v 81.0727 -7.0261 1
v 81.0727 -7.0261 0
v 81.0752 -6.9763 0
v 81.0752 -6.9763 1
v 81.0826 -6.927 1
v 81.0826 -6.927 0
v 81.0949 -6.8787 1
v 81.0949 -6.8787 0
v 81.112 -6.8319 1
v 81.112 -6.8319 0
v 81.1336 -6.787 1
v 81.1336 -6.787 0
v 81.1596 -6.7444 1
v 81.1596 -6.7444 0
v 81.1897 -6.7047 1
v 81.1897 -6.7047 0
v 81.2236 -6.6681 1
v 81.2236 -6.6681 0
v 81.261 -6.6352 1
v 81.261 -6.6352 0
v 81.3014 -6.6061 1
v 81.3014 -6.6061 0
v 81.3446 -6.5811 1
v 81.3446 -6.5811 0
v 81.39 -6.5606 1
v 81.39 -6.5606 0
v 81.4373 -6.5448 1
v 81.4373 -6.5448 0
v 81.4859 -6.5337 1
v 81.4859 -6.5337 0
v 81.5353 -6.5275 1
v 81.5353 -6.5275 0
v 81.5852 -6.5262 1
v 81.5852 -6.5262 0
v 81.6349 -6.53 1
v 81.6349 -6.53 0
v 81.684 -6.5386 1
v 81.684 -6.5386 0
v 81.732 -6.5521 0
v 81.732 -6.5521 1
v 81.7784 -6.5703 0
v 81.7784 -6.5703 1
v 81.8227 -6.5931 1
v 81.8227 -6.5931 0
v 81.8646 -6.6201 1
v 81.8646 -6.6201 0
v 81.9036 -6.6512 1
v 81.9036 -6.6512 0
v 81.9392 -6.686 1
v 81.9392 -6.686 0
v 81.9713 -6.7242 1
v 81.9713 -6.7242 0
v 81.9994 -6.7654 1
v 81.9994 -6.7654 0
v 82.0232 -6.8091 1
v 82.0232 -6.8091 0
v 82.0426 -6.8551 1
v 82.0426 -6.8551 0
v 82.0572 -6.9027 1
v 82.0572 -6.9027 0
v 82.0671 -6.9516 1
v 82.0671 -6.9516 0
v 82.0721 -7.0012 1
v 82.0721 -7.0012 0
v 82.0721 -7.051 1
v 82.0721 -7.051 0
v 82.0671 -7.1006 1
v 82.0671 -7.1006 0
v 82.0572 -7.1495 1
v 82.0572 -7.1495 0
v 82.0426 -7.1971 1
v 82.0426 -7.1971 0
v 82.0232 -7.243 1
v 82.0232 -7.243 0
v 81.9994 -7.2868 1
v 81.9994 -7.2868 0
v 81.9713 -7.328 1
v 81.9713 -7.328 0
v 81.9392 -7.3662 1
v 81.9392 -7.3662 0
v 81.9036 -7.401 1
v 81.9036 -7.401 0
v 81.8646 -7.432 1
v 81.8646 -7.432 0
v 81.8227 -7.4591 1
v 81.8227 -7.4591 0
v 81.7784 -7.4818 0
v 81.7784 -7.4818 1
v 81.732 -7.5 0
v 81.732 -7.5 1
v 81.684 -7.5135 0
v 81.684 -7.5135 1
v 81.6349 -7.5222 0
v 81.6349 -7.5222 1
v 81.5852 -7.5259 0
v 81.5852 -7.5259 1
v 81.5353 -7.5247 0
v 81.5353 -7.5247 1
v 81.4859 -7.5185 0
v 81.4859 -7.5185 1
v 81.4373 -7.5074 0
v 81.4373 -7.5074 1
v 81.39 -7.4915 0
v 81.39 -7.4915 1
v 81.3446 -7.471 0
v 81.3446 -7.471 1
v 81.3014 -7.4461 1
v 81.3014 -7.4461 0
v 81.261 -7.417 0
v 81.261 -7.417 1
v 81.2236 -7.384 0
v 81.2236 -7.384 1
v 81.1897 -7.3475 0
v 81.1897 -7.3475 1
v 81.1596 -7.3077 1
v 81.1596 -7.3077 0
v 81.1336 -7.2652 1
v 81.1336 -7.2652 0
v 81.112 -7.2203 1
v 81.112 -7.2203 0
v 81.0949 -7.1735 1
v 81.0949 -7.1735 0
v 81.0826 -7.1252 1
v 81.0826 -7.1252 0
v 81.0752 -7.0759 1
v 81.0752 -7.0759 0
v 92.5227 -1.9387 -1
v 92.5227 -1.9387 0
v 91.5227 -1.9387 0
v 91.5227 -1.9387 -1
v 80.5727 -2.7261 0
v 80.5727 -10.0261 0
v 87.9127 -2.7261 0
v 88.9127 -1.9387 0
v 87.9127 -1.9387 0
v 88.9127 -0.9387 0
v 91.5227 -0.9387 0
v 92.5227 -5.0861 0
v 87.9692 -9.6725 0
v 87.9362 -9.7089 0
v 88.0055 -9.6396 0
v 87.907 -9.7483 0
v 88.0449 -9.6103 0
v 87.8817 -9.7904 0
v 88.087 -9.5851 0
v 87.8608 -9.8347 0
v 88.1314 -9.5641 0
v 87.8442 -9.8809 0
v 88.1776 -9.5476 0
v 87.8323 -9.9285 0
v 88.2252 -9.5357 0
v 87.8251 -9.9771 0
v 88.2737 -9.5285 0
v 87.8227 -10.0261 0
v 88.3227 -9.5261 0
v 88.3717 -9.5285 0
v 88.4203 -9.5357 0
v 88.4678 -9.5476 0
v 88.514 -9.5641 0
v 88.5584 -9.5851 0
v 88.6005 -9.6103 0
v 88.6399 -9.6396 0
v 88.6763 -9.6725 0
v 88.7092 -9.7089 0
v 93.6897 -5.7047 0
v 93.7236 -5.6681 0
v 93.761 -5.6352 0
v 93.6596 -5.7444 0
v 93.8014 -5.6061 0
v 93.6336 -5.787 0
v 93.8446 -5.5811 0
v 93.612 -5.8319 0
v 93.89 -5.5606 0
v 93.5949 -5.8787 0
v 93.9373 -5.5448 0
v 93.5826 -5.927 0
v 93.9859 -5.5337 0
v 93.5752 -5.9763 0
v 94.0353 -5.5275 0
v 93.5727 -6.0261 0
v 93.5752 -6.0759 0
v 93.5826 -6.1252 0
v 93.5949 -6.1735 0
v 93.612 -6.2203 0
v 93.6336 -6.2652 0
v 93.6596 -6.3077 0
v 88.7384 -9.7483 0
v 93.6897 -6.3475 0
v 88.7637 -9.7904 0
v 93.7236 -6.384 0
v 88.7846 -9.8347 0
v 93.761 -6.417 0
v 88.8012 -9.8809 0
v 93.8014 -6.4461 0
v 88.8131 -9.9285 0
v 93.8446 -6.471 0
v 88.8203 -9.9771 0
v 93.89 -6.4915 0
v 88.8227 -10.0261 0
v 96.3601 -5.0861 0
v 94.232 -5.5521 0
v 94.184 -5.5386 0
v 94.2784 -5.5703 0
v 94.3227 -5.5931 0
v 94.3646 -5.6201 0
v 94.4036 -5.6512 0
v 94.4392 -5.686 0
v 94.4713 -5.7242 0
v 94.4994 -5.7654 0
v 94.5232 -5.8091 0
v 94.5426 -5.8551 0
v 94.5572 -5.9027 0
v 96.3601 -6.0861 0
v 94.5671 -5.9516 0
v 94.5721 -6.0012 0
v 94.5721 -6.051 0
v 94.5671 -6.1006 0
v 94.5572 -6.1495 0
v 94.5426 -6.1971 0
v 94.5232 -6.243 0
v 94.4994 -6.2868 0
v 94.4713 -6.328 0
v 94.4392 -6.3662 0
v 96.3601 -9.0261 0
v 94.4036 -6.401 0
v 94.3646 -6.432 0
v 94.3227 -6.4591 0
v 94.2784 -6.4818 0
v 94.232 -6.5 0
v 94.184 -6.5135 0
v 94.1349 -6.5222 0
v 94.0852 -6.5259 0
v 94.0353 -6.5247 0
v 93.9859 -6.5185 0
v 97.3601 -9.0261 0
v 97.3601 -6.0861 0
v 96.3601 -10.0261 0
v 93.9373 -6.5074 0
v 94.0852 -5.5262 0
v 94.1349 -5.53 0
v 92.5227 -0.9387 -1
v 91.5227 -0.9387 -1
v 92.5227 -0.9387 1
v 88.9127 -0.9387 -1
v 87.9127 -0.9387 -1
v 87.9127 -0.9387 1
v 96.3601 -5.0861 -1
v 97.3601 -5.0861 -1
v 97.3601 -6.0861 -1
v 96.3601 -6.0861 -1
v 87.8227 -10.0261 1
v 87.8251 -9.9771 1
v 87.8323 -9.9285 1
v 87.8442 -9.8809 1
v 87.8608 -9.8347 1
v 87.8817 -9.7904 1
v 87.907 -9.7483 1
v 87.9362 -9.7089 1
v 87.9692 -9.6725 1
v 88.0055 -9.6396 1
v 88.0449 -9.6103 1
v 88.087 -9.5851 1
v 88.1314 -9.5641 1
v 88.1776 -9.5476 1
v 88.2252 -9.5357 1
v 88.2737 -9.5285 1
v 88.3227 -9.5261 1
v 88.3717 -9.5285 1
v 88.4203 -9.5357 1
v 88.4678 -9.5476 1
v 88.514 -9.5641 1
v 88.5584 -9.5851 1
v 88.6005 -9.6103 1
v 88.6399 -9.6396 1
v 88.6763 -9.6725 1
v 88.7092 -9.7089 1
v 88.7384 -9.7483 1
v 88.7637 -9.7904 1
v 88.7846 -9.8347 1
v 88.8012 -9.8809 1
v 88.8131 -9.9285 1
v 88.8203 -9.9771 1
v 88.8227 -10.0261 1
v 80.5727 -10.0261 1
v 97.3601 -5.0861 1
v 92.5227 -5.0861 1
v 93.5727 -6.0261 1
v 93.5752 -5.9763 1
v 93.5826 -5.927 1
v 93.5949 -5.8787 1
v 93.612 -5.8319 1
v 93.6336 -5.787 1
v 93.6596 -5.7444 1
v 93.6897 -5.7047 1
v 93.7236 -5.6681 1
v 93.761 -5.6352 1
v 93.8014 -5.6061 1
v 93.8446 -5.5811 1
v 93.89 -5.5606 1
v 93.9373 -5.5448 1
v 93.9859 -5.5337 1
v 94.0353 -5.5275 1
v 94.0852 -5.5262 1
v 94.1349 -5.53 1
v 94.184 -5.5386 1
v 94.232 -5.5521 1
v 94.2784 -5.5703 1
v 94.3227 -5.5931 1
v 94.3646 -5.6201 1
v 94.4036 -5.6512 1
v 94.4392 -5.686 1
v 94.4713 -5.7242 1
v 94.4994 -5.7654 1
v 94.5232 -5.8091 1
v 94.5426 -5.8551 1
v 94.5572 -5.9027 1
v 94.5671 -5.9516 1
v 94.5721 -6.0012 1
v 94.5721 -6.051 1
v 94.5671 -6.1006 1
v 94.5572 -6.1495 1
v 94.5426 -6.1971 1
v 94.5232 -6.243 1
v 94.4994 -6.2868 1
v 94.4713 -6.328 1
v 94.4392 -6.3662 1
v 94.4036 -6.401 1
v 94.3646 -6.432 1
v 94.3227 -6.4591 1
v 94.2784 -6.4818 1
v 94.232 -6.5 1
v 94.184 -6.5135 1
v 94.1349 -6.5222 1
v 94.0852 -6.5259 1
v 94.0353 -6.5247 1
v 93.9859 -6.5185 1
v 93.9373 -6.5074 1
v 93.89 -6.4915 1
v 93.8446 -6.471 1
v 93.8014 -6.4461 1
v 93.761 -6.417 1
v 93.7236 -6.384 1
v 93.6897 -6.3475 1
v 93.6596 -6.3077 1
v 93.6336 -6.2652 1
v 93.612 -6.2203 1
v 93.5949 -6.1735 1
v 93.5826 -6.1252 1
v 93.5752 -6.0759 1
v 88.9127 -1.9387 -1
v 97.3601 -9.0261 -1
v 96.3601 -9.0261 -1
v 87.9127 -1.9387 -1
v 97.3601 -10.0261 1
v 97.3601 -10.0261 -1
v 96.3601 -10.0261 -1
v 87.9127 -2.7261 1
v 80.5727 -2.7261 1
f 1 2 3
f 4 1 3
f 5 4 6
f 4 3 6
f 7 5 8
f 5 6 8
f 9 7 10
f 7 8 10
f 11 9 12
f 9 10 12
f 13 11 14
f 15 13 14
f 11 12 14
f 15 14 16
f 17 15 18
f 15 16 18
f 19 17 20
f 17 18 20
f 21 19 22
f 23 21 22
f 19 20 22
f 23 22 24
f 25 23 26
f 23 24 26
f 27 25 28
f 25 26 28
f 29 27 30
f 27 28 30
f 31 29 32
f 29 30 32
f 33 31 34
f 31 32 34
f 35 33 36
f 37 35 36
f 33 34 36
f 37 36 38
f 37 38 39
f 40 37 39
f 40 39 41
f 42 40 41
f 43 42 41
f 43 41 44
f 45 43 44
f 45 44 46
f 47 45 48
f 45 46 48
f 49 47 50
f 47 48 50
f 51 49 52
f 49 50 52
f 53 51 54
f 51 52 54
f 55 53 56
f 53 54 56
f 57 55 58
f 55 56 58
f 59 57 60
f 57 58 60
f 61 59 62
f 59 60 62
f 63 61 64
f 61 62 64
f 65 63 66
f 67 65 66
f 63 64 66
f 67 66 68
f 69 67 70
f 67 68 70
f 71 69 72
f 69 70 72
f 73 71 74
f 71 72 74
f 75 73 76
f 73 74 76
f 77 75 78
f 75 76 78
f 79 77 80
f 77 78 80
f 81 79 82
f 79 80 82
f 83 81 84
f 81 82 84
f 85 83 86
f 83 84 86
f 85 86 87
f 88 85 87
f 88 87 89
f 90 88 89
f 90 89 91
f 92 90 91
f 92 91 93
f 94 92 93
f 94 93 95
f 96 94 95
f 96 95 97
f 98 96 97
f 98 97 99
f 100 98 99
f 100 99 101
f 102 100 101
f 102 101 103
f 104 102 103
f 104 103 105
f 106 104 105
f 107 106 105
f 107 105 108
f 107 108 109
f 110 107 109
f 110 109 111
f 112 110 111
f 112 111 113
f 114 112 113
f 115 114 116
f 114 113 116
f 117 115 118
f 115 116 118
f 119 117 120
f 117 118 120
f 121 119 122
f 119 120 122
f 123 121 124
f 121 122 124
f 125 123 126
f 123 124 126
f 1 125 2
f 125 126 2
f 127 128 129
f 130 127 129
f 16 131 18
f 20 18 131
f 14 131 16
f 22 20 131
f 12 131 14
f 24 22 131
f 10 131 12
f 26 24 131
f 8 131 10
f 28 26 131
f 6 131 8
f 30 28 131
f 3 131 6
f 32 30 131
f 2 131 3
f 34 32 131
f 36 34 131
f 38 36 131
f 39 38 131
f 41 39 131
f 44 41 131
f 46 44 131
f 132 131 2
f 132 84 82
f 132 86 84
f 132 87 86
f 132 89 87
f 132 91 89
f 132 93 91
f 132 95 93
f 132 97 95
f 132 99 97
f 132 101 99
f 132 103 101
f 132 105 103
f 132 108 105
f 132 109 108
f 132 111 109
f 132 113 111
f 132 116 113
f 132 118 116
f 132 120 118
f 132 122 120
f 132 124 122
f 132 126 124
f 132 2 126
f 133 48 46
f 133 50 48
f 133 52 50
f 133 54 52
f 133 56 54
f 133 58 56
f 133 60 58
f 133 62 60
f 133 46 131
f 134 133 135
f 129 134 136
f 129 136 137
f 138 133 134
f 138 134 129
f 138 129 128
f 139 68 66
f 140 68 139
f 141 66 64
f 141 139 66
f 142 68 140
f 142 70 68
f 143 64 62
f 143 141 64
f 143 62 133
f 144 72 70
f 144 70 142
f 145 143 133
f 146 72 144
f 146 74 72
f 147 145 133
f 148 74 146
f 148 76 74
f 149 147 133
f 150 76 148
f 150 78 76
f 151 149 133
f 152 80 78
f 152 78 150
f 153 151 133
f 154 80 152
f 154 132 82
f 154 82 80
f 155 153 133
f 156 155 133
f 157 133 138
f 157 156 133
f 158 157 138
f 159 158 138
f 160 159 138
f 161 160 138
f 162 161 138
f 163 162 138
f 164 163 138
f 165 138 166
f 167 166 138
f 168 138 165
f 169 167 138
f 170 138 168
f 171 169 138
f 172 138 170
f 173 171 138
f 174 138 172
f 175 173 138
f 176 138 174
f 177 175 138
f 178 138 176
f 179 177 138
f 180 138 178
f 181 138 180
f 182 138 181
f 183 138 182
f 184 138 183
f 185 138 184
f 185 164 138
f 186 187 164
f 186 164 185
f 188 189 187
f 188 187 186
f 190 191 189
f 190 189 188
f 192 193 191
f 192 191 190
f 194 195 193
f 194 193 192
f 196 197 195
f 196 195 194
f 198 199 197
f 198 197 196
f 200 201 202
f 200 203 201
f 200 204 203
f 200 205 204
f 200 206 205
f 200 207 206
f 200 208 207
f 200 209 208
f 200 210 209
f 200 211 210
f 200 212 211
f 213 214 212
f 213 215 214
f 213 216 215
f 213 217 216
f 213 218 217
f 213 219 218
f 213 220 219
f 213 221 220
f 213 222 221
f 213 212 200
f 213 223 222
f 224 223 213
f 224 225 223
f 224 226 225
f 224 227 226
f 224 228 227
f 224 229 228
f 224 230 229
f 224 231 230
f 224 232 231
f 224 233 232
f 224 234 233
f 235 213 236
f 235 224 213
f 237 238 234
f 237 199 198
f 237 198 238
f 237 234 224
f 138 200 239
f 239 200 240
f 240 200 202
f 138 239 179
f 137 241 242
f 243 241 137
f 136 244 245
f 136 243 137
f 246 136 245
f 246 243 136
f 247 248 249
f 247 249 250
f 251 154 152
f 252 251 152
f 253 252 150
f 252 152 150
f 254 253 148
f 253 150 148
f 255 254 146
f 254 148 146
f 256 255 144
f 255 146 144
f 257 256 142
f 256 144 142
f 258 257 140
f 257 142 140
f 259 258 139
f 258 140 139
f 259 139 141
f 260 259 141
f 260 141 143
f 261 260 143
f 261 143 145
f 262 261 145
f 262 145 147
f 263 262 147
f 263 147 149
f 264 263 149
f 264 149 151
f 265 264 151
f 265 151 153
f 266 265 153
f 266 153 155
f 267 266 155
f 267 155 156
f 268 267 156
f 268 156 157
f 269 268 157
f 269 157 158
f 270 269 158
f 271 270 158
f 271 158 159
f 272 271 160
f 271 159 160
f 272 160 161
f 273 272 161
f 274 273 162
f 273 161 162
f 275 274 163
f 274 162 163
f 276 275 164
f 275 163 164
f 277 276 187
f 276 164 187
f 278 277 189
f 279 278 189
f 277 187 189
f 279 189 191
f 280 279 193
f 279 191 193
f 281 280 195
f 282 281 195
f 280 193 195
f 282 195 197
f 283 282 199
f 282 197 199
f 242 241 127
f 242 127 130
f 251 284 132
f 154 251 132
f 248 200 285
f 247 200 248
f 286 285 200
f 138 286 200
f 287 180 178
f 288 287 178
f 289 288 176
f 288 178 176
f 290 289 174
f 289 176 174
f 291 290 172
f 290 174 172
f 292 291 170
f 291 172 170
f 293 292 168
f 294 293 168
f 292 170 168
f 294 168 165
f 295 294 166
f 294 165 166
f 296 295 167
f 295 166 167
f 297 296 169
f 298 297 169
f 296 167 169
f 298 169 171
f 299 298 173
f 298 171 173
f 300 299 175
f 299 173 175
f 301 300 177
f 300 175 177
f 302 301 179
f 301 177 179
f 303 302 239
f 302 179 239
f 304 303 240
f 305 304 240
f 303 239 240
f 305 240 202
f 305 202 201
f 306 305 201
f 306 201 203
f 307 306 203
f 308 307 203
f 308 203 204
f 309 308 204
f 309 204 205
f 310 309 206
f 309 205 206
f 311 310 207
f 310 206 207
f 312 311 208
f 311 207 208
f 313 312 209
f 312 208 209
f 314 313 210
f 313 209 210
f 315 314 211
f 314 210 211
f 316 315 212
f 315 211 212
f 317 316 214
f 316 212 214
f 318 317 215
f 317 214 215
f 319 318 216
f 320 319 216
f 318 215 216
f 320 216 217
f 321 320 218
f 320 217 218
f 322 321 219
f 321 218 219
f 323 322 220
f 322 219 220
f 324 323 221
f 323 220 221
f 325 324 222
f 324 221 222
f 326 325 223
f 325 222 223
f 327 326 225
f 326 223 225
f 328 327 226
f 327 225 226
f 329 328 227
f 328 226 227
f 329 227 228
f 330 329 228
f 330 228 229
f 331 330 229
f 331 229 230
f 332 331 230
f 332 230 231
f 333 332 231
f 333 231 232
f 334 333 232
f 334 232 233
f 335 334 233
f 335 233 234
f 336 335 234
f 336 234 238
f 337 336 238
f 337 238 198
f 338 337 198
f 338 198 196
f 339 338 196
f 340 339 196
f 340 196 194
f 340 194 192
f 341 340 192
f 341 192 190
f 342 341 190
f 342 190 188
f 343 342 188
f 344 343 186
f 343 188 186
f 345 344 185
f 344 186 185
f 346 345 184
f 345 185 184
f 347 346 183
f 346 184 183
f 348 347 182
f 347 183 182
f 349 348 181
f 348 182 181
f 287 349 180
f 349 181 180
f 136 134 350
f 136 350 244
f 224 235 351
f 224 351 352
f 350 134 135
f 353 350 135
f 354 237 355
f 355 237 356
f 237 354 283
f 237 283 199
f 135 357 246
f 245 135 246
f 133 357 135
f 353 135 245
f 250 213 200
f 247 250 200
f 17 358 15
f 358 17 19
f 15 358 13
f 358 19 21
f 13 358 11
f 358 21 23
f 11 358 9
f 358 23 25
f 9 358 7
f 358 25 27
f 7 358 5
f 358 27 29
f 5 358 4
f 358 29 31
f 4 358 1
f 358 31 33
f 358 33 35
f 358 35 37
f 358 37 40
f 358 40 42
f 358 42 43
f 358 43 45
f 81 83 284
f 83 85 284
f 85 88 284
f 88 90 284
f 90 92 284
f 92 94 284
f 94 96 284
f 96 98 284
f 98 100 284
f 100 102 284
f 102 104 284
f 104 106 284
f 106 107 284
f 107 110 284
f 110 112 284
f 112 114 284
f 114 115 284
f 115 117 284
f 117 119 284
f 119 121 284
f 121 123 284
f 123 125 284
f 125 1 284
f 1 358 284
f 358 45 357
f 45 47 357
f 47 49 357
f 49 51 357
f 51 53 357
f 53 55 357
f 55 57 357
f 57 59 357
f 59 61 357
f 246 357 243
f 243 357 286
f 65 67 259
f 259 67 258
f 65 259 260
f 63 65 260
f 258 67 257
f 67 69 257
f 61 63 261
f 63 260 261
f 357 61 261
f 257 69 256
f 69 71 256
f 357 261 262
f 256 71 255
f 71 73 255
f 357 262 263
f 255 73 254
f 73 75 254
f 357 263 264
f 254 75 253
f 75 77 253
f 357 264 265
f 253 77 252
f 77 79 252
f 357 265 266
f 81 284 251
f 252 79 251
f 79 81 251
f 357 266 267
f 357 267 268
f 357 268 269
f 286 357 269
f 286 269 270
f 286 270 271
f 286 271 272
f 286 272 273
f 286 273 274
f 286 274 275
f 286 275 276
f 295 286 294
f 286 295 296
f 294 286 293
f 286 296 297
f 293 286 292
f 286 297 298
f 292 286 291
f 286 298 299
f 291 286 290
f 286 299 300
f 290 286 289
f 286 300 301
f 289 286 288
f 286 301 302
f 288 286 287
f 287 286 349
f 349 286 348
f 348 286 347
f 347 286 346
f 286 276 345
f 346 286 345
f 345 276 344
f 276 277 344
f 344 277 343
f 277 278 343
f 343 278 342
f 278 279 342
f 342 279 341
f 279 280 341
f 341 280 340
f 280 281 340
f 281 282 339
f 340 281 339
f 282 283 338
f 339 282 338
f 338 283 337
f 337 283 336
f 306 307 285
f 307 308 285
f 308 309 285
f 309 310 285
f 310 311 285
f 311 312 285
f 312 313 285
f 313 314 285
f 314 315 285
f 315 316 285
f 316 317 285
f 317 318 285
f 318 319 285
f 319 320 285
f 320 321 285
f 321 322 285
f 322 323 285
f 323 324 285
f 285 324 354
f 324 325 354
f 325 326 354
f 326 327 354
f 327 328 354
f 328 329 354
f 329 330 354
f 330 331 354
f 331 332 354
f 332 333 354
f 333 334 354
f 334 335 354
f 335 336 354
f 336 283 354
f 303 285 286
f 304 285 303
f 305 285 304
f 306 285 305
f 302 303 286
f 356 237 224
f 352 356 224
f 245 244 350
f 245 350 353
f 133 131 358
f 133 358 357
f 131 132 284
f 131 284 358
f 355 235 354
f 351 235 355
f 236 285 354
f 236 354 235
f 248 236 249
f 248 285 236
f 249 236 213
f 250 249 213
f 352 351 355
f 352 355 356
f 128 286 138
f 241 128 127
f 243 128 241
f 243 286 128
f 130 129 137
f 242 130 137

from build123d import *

# Parameters (mm, degrees)
SKETCH1_W            = 15
SKETCH1_H            = 7.3
BOSS_EXTRUDE1_DEPTH  = 1
SKETCH2_W            = 3.05
SKETCH2_H            = 2.36
CUT_EXTRUDE1_DEPTH   = 1
SKETCH5_W            = 1
SKETCH5_H            = 4.94
ENGTH_EXTRUDE_DEPTH  = 1.7874
SKETCH6_W            = 4.61
SKETCH6_H            = 1
HEIGHT_EXTRUDE_DEPTH = 1.7874
SCREWS_R             = 0.5
CUT_EXTRUDE2_DEPTH   = 1
SKETCH8_W            = 1
SKETCH8_H            = 1
PINS_DEPTH           = 1


with BuildPart() as part:
    # Sketch1 → Boss-Extrude1 (new body)
    with BuildSketch(Plane.XY):
        with Locations((88.072707455, -6.376080206)):
            Rectangle(SKETCH1_W, SKETCH1_H)
    extrude(amount=BOSS_EXTRUDE1_DEPTH)

    # Sketch2 → Cut-Extrude1 (cut)
    with BuildSketch(Plane.XY.offset(1)):
        with Locations((94.047707455, -3.906080206)):
            Rectangle(SKETCH2_W, SKETCH2_H)
    extrude(amount=-CUT_EXTRUDE1_DEPTH, mode=Mode.SUBTRACT)

    # Sketch5 → :ength-Extrude (add)
    with BuildSketch(Plane(origin=(95.572707455, 0, 0), x_dir=(0, 0, -1), z_dir=(1, 0, 0))):
        with Locations((-0.5, -7.556080206)):
            Rectangle(SKETCH5_W, SKETCH5_H)
    extrude(amount=ENGTH_EXTRUDE_DEPTH)

    # Sketch6 → Height-Extrude (add)
    with BuildSketch(Plane(origin=(0, -2.726080206, 0), x_dir=(1, 0, 0), z_dir=(0, 1, 0))):
        with Locations((90.217707455, -0.5)):
            Rectangle(SKETCH6_W, SKETCH6_H)
    extrude(amount=HEIGHT_EXTRUDE_DEPTH)

    # Screws → Cut-Extrude2 (cut)
    with BuildSketch(Plane(origin=(0, 0, 0), x_dir=(-1, 0, 0), z_dir=(0, 0, -1))):
        with Locations((-81.572707455, -7.026080206)):
            Circle(SCREWS_R)
        with Locations((-88.322707455, -10.026080206)):
            Circle(SCREWS_R)
        with Locations((-94.072707455, -6.026080206)):
            Circle(SCREWS_R)
    extrude(amount=-CUT_EXTRUDE2_DEPTH, mode=Mode.SUBTRACT)

    # Sketch8 → Pins (add)
    with BuildSketch(Plane(origin=(0, 0, 0), x_dir=(-1, 0, 0), z_dir=(0, 0, -1))):
        with Locations((-92.022707455, -1.438680206)):
            Rectangle(SKETCH8_W, SKETCH8_H)
        with Locations((-88.412707455, -1.438680206)):
            Rectangle(SKETCH8_W, SKETCH8_H)
        with Locations((-96.860107455, -5.586080206)):
            Rectangle(SKETCH8_W, SKETCH8_H)
        with Locations((-96.860107455, -9.526080206)):
            Rectangle(SKETCH8_W, SKETCH8_H)
    extrude(amount=PINS_DEPTH)


solid = part.part
